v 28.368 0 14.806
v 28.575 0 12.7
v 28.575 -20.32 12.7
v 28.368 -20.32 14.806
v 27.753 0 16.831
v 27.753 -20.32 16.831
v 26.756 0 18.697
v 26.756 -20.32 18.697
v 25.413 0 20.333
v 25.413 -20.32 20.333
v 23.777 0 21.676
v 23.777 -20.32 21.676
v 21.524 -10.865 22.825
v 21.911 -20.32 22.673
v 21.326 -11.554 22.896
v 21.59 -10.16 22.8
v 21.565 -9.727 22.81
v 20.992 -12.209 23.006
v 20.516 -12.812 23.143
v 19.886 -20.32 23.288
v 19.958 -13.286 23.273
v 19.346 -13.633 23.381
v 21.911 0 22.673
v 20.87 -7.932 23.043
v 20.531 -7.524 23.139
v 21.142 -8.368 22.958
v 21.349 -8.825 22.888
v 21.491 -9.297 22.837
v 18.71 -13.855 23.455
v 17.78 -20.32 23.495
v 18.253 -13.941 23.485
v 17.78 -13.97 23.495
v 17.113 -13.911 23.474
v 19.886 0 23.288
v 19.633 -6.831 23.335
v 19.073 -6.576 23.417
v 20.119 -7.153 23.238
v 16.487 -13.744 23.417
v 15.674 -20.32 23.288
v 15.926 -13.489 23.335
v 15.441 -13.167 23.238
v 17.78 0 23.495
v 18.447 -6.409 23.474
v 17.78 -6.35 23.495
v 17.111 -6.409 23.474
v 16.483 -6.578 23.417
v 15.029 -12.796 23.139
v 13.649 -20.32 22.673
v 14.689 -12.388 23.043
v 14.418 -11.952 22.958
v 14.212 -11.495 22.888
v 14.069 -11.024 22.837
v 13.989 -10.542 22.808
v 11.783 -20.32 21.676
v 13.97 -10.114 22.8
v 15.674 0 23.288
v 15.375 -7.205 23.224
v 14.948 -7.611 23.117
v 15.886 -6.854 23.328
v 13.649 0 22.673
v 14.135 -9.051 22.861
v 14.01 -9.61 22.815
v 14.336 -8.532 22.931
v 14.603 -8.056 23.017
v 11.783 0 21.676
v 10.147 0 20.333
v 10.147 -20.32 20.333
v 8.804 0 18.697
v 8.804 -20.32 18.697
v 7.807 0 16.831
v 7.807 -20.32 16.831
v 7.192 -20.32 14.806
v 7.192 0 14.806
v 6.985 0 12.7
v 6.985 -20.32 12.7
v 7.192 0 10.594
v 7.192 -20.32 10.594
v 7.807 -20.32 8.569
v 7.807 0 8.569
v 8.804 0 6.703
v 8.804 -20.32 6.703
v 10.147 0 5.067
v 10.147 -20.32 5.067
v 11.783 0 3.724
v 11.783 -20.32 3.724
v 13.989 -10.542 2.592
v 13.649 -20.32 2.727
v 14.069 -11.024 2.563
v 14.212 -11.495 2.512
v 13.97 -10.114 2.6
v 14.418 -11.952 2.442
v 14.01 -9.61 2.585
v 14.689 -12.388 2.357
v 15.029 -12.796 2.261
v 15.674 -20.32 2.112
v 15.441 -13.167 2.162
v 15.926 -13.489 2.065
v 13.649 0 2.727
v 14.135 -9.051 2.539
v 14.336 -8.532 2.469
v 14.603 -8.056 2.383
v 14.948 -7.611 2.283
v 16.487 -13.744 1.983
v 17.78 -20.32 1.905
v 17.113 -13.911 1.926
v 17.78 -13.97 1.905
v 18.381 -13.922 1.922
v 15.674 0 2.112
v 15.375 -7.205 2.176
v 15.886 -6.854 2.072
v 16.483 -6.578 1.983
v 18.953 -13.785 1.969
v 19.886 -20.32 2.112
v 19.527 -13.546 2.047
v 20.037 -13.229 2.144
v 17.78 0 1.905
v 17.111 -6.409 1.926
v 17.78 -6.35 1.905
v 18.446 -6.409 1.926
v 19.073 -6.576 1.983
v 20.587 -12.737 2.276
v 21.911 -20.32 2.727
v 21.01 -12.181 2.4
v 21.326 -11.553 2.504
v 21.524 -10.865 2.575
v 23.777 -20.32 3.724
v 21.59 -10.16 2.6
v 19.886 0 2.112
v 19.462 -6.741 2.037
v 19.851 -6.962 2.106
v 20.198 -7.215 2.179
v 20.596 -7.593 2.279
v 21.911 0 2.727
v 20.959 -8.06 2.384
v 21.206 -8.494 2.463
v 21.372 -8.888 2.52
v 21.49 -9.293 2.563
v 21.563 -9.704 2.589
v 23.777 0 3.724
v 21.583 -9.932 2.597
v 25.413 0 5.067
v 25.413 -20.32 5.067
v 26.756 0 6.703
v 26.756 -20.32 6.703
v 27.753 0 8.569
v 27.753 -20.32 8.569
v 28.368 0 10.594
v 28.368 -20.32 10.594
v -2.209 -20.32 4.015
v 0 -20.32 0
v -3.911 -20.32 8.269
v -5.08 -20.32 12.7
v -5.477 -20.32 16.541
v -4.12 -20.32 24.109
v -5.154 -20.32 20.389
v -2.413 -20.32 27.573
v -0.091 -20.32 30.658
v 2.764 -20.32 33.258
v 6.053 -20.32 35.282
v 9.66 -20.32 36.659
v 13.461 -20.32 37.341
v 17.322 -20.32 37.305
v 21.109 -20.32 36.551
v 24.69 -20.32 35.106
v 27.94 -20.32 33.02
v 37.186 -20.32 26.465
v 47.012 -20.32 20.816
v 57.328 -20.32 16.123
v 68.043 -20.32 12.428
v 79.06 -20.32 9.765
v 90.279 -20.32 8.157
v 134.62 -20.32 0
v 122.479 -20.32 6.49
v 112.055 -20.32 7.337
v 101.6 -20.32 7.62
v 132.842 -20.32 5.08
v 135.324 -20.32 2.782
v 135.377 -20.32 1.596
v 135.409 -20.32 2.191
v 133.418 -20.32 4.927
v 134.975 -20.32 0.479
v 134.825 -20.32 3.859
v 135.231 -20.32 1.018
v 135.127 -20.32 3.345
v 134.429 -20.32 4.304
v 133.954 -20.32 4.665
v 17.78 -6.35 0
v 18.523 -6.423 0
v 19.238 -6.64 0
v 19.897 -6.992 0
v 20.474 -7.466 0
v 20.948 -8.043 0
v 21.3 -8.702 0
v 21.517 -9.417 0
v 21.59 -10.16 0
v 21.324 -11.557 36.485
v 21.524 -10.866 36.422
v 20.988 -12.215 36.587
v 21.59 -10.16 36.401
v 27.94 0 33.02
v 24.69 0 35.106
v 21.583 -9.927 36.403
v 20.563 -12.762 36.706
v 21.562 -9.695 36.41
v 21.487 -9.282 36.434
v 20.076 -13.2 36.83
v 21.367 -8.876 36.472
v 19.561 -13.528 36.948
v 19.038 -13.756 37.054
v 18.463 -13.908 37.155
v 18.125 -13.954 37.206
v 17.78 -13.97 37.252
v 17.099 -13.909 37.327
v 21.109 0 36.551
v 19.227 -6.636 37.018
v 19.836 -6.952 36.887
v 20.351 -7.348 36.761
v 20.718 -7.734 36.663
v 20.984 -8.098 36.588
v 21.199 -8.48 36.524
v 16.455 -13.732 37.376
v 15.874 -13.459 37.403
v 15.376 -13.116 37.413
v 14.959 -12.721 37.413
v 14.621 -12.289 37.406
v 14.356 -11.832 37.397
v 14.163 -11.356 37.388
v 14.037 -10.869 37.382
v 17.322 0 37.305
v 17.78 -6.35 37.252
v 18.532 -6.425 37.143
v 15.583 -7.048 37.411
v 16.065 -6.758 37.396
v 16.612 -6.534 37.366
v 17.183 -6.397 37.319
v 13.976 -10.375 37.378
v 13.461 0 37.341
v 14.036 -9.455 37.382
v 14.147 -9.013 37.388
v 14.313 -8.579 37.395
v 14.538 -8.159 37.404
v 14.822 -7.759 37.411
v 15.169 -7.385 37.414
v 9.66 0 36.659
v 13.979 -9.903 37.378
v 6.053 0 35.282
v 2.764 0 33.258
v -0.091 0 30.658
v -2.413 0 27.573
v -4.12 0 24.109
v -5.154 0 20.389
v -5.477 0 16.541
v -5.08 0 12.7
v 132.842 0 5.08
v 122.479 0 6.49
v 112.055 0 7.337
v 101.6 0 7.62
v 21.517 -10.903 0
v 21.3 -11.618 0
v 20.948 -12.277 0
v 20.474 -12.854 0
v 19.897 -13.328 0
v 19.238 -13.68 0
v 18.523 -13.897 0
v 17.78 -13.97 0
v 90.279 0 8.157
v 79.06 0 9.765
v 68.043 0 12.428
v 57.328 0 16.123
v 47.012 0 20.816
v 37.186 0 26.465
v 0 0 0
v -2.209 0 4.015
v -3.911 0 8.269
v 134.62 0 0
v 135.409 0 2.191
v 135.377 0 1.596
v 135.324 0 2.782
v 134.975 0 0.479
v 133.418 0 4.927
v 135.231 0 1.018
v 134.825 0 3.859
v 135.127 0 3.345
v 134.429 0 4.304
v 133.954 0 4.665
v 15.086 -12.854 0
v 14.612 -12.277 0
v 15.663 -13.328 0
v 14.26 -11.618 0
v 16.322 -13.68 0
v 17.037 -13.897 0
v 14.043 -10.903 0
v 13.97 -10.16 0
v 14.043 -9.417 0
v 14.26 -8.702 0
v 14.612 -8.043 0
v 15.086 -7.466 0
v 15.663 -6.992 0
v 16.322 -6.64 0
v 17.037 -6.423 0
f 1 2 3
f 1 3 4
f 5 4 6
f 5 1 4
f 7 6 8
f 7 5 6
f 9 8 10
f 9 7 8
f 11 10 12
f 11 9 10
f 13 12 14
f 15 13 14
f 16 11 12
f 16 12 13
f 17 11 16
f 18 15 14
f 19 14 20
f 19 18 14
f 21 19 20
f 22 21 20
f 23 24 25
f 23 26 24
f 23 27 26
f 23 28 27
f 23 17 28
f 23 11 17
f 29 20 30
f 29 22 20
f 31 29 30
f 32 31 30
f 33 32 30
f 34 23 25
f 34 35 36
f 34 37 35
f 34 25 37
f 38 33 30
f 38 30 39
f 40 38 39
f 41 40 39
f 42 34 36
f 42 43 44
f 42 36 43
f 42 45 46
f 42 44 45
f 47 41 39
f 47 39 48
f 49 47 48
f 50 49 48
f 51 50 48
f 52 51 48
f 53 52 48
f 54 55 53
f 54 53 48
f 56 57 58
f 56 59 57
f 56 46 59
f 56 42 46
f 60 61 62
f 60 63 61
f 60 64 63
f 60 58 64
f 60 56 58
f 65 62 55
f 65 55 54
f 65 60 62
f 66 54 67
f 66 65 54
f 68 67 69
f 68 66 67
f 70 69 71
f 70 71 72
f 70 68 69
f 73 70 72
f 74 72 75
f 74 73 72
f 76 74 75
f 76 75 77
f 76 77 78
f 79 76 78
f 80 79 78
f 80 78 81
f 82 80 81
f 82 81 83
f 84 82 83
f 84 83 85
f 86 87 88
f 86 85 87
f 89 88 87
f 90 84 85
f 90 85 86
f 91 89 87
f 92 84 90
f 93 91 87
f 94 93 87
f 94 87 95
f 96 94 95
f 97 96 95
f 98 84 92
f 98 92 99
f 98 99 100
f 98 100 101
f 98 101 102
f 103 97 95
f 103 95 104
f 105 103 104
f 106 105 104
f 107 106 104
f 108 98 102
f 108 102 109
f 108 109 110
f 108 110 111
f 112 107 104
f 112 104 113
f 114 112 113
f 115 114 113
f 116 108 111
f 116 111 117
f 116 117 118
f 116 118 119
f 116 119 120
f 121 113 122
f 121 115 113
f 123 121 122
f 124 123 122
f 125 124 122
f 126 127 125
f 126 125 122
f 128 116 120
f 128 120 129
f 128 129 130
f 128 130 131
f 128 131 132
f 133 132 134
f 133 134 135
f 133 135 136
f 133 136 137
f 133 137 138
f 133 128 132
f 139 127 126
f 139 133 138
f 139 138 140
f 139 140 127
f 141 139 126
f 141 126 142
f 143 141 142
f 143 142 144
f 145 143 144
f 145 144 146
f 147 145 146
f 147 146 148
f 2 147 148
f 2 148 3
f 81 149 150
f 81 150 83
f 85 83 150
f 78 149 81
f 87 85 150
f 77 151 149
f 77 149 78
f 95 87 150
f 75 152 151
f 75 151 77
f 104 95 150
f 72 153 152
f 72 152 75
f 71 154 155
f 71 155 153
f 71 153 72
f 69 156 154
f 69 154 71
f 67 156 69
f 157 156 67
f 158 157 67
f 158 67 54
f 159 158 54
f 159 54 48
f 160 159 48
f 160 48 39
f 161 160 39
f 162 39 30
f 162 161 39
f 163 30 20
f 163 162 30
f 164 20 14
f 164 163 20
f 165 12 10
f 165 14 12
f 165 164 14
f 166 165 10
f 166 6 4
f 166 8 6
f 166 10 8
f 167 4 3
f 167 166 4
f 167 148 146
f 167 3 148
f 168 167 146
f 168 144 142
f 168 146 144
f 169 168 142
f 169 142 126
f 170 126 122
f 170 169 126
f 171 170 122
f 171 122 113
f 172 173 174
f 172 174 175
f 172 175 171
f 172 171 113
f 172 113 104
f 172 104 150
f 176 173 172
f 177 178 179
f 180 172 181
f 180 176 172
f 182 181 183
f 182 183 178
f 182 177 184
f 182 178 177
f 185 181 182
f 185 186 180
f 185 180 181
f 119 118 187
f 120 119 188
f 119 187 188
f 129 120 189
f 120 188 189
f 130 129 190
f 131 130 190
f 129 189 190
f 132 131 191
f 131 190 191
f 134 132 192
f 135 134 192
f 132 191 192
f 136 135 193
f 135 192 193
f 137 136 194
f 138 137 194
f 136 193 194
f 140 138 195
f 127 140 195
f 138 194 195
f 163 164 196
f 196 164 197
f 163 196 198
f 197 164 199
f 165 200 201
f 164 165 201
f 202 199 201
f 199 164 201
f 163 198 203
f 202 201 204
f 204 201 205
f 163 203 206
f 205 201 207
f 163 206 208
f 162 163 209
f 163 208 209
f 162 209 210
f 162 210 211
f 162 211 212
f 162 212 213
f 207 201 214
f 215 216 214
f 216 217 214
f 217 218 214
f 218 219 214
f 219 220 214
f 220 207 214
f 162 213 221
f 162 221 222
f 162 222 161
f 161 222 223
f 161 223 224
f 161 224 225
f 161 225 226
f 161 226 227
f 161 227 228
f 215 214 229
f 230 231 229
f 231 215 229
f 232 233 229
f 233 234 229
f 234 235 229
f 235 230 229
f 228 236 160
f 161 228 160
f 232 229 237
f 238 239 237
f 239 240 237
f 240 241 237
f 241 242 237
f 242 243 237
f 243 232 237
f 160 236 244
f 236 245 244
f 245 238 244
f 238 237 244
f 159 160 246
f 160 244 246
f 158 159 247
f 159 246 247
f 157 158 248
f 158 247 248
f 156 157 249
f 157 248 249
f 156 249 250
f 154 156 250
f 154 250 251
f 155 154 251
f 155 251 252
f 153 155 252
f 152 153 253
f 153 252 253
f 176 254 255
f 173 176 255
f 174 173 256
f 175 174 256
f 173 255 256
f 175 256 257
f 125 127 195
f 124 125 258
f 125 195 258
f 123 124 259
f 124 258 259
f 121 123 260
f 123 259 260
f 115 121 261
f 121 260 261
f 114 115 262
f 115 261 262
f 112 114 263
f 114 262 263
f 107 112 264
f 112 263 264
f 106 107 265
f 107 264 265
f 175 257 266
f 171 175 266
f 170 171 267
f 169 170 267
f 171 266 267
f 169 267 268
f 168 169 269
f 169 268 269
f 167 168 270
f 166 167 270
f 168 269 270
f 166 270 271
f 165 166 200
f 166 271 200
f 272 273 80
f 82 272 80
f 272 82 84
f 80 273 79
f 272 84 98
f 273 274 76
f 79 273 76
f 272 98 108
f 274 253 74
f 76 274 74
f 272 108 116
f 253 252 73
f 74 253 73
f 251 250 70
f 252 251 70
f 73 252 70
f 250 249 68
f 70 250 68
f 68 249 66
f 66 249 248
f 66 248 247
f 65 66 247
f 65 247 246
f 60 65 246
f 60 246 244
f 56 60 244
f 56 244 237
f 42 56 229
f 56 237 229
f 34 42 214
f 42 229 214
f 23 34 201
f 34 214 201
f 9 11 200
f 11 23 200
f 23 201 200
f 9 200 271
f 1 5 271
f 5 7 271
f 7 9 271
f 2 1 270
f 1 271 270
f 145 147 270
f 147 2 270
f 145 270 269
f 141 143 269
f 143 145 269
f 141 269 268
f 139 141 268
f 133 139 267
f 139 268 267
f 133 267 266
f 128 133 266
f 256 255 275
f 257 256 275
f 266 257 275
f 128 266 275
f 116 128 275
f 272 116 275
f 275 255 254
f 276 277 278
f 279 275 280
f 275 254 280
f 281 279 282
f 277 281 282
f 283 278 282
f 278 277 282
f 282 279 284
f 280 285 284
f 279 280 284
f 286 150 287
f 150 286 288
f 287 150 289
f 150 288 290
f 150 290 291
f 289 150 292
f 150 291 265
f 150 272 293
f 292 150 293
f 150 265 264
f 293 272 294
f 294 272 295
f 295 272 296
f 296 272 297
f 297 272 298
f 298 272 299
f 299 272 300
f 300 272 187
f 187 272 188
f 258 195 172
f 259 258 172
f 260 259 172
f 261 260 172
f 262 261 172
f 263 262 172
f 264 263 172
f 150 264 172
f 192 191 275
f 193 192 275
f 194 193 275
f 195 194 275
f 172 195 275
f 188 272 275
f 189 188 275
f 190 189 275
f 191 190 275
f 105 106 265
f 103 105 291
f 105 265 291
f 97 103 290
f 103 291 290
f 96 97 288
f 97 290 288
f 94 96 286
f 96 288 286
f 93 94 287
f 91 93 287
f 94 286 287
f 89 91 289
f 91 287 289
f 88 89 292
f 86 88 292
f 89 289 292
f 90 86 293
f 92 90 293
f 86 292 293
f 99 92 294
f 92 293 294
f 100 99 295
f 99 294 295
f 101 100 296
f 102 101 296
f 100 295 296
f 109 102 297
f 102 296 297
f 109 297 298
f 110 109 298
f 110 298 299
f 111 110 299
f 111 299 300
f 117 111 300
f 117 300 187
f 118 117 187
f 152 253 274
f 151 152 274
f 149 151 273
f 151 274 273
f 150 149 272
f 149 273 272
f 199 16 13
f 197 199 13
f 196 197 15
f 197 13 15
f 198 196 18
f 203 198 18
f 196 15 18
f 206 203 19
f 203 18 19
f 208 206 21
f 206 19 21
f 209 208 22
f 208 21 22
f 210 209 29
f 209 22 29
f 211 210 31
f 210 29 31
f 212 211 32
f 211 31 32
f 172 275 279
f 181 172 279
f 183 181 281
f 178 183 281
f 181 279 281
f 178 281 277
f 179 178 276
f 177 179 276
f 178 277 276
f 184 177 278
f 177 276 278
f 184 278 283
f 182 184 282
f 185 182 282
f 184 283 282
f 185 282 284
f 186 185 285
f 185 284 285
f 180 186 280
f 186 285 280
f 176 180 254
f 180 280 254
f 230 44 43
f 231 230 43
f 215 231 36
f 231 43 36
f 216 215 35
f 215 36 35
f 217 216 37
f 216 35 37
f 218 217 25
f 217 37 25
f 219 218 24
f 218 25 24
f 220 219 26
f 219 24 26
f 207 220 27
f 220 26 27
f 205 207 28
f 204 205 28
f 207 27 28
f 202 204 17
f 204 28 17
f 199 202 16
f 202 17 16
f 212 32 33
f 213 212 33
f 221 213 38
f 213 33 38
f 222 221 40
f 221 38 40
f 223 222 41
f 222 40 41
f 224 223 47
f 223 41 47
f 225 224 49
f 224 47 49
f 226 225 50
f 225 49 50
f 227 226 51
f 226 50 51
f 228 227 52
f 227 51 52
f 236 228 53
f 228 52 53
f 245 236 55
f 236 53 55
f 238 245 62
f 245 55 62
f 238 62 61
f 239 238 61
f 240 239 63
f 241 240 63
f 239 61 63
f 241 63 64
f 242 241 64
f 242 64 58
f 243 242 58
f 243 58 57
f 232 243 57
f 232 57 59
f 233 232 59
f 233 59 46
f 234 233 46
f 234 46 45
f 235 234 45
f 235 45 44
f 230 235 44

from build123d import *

# Parameters (mm, degrees)
F0_R     = 10.795
F1_DEPTH = 20.32
F3_DEPTH = 37.415268


with BuildPart() as f1:
    # F0 (on Front) → F1 (new body)
    with BuildSketch(Plane.XZ):
        with BuildLine():
            ThreePointArc((-5.08, 12.7), (-3.12545, 6.11582), (0, 0))
            Line((0, 0), (134.62, 0))
            ThreePointArc((134.62, 0), (135.239562, 3.067997), (132.842, 5.08))
            ThreePointArc((132.842, 5.08), (117.272541, 6.983954), (101.6, 7.62))
            ThreePointArc((101.6, 7.62), (62.641831, 14.148311), (27.94, 33.02))
            ThreePointArc((27.94, 33.02), (4.360893, 34.347299), (-5.08, 12.7))
        make_face()
        with Locations((17.78, 12.7)):
            Circle(F0_R, mode=Mode.SUBTRACT)
    extrude(amount=F1_DEPTH)

    # F2 (on face) → F3 (cut, through all)
    with BuildSketch(Plane(origin=(0, 0, 0), x_dir=(1, 0, 0), z_dir=(0, 0, -1))):
        with BuildLine():
            ThreePointArc((17.78, 6.35), (20.474077, 7.465923), (21.59, 10.16))
            ThreePointArc((21.59, 10.16), (20.474077, 12.854077), (17.78, 13.97))
            Line((17.78, 13.97), (17.78, 6.35))
        make_face()
        with BuildLine():
            Line((17.78, 6.35), (17.78, 13.97))
            ThreePointArc((17.78, 13.97), (13.97, 10.16), (17.78, 6.35))
        make_face()
    extrude(amount=-F3_DEPTH, mode=Mode.SUBTRACT)


solid = f1.part
